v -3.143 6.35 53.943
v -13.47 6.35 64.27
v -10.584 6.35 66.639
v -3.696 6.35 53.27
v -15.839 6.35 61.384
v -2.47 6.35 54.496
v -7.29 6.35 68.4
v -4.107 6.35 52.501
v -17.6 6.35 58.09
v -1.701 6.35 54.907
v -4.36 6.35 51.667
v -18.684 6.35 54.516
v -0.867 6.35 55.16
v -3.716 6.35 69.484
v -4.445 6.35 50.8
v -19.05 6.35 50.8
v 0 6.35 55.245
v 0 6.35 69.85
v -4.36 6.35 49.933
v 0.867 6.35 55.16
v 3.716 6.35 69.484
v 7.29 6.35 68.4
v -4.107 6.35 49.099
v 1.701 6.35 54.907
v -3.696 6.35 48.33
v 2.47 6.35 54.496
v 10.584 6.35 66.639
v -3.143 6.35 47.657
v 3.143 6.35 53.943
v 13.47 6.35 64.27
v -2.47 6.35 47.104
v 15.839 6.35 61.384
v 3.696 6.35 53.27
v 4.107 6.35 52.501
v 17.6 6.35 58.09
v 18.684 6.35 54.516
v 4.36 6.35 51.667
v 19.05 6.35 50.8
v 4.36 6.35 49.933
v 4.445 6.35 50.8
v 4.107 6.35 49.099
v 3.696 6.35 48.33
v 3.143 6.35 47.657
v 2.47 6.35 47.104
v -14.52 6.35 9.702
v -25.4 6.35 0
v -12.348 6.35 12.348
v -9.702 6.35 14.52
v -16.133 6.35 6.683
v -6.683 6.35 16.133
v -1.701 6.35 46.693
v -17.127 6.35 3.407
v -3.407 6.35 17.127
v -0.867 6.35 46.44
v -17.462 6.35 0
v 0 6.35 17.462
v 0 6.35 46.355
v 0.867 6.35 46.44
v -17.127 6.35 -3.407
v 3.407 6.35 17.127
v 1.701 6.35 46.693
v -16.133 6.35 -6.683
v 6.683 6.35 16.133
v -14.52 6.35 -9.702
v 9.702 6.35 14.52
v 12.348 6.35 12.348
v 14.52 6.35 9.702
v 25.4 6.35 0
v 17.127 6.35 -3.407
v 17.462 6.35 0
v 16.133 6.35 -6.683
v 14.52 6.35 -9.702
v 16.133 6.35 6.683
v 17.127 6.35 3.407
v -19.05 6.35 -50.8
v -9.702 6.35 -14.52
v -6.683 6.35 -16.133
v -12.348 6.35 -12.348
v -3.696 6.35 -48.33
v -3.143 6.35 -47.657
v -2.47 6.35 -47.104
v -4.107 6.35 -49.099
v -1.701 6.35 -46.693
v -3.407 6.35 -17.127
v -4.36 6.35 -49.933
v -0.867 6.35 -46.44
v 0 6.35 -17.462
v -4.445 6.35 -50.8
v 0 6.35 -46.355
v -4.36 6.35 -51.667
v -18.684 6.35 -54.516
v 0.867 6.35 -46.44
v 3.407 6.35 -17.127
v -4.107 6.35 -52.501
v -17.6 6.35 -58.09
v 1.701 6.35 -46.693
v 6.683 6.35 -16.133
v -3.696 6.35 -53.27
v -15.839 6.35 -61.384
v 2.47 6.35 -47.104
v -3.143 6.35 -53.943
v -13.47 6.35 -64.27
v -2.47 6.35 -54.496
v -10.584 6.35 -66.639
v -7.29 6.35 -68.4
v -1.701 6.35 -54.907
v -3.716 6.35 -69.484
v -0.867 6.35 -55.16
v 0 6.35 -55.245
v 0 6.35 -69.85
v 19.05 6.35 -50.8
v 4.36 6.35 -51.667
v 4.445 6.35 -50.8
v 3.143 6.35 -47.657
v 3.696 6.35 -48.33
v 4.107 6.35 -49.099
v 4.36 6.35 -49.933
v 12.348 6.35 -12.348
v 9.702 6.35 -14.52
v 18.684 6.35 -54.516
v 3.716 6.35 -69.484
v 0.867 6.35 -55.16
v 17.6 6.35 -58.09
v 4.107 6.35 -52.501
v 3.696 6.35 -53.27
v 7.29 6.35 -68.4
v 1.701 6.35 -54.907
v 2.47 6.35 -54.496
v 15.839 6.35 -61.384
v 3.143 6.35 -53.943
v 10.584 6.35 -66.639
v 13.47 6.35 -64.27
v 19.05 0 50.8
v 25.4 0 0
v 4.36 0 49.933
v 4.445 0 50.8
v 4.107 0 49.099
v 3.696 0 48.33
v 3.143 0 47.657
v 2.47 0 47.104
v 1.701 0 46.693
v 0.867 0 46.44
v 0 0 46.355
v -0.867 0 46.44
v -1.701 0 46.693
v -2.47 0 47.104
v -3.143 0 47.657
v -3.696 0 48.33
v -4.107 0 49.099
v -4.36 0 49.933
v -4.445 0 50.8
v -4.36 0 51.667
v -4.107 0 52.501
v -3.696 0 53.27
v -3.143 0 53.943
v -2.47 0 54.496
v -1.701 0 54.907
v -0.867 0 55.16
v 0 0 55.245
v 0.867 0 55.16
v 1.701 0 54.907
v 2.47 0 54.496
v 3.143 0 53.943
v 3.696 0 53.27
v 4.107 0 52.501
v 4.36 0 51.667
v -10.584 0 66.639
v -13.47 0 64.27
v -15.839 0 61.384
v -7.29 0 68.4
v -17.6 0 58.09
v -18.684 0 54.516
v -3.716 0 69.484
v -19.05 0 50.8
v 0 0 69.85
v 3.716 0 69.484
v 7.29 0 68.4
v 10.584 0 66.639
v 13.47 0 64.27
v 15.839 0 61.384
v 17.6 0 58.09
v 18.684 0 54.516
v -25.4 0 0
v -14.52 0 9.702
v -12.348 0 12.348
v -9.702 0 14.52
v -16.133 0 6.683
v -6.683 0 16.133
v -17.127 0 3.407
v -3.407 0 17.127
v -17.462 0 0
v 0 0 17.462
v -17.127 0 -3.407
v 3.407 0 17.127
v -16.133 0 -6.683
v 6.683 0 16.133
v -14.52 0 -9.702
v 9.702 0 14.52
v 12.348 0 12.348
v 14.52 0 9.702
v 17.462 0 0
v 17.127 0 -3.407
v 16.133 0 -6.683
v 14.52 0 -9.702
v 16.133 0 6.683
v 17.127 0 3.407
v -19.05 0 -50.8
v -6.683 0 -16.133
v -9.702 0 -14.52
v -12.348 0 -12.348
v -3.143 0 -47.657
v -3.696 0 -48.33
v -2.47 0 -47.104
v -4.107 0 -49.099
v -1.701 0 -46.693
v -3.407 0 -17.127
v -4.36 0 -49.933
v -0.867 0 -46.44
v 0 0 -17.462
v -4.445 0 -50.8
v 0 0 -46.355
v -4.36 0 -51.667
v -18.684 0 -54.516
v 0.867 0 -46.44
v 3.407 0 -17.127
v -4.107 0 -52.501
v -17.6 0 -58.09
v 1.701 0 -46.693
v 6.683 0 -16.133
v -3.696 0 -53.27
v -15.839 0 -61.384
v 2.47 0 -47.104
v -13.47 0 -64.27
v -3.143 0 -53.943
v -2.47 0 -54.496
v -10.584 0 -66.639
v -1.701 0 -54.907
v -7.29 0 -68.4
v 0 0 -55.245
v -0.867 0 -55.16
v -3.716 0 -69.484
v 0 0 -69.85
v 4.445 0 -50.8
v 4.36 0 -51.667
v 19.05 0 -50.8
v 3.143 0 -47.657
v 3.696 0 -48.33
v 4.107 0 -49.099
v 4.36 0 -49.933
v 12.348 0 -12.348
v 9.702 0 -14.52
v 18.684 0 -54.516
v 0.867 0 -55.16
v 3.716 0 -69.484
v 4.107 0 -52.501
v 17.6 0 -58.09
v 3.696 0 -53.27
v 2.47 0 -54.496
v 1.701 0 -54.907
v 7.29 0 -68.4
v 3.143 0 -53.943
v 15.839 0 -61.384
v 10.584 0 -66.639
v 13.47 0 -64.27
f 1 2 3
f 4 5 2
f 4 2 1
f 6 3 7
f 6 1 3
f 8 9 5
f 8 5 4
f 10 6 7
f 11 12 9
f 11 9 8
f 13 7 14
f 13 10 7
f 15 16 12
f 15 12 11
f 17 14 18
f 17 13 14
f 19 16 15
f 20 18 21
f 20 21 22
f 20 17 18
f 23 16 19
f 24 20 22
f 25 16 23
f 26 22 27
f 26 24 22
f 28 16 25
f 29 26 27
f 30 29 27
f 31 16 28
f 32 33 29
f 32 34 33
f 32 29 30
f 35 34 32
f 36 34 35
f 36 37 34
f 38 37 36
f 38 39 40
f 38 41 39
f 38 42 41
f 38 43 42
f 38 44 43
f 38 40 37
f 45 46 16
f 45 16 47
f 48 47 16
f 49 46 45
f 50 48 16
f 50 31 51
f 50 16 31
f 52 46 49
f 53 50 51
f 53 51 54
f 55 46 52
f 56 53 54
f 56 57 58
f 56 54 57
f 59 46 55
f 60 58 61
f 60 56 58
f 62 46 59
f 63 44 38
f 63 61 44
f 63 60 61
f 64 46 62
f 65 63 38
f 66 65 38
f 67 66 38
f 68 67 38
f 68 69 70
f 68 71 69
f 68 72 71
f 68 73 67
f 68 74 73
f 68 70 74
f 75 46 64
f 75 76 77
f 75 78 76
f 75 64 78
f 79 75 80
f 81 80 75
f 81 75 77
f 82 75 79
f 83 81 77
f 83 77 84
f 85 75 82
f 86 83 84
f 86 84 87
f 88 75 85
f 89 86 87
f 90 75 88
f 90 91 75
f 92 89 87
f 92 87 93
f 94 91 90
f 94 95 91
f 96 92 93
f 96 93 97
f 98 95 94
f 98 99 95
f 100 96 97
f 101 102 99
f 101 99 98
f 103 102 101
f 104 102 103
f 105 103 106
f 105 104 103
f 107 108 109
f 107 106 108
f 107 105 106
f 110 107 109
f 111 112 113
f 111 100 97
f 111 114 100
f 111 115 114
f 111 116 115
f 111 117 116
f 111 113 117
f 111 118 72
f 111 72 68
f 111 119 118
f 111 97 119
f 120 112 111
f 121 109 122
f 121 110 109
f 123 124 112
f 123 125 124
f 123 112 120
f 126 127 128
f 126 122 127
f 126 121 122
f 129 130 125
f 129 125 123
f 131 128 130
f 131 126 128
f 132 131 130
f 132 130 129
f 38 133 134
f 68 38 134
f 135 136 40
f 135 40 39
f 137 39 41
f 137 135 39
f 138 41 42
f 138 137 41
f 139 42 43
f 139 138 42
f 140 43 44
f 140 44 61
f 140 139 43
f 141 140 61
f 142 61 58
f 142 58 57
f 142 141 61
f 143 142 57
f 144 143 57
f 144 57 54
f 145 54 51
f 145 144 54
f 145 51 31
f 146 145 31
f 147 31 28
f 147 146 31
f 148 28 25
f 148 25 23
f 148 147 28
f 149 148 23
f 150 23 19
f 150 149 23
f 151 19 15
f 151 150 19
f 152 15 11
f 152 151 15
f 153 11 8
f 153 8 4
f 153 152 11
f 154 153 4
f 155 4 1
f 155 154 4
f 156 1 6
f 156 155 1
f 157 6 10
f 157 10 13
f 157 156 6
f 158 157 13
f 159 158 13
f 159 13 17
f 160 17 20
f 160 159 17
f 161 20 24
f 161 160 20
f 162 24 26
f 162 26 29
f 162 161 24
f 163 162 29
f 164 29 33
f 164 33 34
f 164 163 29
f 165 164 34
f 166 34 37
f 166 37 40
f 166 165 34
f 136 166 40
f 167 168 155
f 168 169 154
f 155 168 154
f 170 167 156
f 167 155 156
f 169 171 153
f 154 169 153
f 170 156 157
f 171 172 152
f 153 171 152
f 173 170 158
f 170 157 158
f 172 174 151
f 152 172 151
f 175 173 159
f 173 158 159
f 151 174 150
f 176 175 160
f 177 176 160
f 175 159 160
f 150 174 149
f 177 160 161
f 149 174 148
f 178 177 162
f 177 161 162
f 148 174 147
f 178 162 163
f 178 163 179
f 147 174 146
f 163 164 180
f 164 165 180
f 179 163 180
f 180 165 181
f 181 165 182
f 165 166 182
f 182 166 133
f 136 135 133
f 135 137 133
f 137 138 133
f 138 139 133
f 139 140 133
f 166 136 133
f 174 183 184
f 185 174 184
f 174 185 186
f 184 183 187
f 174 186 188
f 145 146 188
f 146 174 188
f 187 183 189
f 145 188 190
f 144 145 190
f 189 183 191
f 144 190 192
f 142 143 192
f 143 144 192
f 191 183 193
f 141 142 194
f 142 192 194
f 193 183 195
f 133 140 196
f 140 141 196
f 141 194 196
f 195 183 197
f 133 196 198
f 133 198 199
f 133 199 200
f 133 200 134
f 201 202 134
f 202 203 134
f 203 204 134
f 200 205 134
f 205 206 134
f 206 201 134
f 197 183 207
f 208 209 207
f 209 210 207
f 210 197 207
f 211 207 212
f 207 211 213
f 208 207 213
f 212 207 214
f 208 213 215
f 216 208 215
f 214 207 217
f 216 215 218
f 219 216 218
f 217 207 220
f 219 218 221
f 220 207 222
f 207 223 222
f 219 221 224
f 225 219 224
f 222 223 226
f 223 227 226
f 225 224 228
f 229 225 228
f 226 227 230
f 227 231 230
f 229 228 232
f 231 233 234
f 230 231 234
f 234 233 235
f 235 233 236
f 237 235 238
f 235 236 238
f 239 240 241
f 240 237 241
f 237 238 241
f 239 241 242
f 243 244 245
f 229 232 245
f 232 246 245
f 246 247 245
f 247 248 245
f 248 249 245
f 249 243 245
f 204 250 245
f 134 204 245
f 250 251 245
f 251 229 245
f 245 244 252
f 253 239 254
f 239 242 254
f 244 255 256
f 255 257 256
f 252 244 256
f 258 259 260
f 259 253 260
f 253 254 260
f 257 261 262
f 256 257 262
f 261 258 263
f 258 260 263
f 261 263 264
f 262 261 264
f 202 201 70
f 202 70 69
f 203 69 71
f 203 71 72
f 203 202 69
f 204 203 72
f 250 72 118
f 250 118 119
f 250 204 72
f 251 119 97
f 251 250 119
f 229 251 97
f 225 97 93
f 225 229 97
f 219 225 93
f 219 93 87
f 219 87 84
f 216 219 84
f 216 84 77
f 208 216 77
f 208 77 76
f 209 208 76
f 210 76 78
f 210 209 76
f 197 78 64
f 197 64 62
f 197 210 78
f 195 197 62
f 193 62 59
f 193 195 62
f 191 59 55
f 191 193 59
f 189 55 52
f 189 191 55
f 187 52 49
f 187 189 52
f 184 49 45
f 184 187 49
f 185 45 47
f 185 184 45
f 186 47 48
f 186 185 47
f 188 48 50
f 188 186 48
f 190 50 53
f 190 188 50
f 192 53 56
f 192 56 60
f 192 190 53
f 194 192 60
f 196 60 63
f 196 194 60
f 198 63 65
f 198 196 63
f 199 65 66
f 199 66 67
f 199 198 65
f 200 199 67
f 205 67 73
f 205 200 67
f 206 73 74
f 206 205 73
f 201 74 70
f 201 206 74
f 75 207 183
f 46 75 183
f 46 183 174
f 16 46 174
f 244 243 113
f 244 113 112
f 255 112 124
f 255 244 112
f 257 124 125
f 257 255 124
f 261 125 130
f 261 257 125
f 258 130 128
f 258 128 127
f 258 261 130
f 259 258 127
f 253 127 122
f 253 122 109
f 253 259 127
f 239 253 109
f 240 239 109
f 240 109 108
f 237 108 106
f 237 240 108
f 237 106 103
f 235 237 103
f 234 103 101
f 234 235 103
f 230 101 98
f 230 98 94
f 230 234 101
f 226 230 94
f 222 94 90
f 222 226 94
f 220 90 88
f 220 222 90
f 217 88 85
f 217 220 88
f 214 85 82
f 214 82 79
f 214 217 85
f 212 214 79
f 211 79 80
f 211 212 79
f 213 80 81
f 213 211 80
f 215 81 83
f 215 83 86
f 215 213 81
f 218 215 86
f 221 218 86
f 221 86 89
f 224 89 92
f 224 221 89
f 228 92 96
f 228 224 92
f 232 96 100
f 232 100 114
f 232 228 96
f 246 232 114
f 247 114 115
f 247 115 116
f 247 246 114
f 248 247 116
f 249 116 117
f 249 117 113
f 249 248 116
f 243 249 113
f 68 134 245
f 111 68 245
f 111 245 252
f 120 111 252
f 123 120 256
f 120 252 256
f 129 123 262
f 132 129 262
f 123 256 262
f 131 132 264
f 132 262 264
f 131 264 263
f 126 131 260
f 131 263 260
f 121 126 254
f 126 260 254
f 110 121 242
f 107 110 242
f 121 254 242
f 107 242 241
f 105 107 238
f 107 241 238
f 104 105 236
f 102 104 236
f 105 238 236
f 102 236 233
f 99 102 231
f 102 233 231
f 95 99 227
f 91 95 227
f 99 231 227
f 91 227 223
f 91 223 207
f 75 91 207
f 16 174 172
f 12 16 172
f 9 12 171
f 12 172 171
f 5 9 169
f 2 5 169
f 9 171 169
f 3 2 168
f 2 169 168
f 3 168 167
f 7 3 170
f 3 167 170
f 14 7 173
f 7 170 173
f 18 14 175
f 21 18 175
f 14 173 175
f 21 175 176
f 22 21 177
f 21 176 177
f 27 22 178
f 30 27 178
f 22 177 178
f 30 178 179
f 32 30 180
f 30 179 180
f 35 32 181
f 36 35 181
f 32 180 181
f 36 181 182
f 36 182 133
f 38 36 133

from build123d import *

# Parameters (mm, degrees)
SKETCH1_R           = 4.445
SKETCH1_R_2         = 17.4625
BOSS_EXTRUDE1_DEPTH = 6.35


with BuildPart() as part:
    # Sketch1 → Boss-Extrude1 (new body)
    with BuildSketch(Plane(origin=(0, 0, 0), x_dir=(1, 0, 0), z_dir=(0, 1, 0))):
        with BuildLine():
            ThreePointArc((-19.05, -50.8), (0, -69.85), (19.05, -50.8))
            Line((19.05, -50.8), (25.4, 0))
            Line((25.4, 0), (19.05, 50.8))
            ThreePointArc((19.05, 50.8), (0, 69.85), (-19.05, 50.8))
            Line((-19.05, 50.8), (-25.4, 0))
            Line((-25.4, 0), (-19.05, -50.8))
        make_face()
        with Locations((0, -50.8)):
            Circle(SKETCH1_R, mode=Mode.SUBTRACT)
        Circle(SKETCH1_R_2, mode=Mode.SUBTRACT)
        with Locations((0, 50.8)):
            Circle(SKETCH1_R, mode=Mode.SUBTRACT)
    extrude(amount=BOSS_EXTRUDE1_DEPTH)


solid = part.part
